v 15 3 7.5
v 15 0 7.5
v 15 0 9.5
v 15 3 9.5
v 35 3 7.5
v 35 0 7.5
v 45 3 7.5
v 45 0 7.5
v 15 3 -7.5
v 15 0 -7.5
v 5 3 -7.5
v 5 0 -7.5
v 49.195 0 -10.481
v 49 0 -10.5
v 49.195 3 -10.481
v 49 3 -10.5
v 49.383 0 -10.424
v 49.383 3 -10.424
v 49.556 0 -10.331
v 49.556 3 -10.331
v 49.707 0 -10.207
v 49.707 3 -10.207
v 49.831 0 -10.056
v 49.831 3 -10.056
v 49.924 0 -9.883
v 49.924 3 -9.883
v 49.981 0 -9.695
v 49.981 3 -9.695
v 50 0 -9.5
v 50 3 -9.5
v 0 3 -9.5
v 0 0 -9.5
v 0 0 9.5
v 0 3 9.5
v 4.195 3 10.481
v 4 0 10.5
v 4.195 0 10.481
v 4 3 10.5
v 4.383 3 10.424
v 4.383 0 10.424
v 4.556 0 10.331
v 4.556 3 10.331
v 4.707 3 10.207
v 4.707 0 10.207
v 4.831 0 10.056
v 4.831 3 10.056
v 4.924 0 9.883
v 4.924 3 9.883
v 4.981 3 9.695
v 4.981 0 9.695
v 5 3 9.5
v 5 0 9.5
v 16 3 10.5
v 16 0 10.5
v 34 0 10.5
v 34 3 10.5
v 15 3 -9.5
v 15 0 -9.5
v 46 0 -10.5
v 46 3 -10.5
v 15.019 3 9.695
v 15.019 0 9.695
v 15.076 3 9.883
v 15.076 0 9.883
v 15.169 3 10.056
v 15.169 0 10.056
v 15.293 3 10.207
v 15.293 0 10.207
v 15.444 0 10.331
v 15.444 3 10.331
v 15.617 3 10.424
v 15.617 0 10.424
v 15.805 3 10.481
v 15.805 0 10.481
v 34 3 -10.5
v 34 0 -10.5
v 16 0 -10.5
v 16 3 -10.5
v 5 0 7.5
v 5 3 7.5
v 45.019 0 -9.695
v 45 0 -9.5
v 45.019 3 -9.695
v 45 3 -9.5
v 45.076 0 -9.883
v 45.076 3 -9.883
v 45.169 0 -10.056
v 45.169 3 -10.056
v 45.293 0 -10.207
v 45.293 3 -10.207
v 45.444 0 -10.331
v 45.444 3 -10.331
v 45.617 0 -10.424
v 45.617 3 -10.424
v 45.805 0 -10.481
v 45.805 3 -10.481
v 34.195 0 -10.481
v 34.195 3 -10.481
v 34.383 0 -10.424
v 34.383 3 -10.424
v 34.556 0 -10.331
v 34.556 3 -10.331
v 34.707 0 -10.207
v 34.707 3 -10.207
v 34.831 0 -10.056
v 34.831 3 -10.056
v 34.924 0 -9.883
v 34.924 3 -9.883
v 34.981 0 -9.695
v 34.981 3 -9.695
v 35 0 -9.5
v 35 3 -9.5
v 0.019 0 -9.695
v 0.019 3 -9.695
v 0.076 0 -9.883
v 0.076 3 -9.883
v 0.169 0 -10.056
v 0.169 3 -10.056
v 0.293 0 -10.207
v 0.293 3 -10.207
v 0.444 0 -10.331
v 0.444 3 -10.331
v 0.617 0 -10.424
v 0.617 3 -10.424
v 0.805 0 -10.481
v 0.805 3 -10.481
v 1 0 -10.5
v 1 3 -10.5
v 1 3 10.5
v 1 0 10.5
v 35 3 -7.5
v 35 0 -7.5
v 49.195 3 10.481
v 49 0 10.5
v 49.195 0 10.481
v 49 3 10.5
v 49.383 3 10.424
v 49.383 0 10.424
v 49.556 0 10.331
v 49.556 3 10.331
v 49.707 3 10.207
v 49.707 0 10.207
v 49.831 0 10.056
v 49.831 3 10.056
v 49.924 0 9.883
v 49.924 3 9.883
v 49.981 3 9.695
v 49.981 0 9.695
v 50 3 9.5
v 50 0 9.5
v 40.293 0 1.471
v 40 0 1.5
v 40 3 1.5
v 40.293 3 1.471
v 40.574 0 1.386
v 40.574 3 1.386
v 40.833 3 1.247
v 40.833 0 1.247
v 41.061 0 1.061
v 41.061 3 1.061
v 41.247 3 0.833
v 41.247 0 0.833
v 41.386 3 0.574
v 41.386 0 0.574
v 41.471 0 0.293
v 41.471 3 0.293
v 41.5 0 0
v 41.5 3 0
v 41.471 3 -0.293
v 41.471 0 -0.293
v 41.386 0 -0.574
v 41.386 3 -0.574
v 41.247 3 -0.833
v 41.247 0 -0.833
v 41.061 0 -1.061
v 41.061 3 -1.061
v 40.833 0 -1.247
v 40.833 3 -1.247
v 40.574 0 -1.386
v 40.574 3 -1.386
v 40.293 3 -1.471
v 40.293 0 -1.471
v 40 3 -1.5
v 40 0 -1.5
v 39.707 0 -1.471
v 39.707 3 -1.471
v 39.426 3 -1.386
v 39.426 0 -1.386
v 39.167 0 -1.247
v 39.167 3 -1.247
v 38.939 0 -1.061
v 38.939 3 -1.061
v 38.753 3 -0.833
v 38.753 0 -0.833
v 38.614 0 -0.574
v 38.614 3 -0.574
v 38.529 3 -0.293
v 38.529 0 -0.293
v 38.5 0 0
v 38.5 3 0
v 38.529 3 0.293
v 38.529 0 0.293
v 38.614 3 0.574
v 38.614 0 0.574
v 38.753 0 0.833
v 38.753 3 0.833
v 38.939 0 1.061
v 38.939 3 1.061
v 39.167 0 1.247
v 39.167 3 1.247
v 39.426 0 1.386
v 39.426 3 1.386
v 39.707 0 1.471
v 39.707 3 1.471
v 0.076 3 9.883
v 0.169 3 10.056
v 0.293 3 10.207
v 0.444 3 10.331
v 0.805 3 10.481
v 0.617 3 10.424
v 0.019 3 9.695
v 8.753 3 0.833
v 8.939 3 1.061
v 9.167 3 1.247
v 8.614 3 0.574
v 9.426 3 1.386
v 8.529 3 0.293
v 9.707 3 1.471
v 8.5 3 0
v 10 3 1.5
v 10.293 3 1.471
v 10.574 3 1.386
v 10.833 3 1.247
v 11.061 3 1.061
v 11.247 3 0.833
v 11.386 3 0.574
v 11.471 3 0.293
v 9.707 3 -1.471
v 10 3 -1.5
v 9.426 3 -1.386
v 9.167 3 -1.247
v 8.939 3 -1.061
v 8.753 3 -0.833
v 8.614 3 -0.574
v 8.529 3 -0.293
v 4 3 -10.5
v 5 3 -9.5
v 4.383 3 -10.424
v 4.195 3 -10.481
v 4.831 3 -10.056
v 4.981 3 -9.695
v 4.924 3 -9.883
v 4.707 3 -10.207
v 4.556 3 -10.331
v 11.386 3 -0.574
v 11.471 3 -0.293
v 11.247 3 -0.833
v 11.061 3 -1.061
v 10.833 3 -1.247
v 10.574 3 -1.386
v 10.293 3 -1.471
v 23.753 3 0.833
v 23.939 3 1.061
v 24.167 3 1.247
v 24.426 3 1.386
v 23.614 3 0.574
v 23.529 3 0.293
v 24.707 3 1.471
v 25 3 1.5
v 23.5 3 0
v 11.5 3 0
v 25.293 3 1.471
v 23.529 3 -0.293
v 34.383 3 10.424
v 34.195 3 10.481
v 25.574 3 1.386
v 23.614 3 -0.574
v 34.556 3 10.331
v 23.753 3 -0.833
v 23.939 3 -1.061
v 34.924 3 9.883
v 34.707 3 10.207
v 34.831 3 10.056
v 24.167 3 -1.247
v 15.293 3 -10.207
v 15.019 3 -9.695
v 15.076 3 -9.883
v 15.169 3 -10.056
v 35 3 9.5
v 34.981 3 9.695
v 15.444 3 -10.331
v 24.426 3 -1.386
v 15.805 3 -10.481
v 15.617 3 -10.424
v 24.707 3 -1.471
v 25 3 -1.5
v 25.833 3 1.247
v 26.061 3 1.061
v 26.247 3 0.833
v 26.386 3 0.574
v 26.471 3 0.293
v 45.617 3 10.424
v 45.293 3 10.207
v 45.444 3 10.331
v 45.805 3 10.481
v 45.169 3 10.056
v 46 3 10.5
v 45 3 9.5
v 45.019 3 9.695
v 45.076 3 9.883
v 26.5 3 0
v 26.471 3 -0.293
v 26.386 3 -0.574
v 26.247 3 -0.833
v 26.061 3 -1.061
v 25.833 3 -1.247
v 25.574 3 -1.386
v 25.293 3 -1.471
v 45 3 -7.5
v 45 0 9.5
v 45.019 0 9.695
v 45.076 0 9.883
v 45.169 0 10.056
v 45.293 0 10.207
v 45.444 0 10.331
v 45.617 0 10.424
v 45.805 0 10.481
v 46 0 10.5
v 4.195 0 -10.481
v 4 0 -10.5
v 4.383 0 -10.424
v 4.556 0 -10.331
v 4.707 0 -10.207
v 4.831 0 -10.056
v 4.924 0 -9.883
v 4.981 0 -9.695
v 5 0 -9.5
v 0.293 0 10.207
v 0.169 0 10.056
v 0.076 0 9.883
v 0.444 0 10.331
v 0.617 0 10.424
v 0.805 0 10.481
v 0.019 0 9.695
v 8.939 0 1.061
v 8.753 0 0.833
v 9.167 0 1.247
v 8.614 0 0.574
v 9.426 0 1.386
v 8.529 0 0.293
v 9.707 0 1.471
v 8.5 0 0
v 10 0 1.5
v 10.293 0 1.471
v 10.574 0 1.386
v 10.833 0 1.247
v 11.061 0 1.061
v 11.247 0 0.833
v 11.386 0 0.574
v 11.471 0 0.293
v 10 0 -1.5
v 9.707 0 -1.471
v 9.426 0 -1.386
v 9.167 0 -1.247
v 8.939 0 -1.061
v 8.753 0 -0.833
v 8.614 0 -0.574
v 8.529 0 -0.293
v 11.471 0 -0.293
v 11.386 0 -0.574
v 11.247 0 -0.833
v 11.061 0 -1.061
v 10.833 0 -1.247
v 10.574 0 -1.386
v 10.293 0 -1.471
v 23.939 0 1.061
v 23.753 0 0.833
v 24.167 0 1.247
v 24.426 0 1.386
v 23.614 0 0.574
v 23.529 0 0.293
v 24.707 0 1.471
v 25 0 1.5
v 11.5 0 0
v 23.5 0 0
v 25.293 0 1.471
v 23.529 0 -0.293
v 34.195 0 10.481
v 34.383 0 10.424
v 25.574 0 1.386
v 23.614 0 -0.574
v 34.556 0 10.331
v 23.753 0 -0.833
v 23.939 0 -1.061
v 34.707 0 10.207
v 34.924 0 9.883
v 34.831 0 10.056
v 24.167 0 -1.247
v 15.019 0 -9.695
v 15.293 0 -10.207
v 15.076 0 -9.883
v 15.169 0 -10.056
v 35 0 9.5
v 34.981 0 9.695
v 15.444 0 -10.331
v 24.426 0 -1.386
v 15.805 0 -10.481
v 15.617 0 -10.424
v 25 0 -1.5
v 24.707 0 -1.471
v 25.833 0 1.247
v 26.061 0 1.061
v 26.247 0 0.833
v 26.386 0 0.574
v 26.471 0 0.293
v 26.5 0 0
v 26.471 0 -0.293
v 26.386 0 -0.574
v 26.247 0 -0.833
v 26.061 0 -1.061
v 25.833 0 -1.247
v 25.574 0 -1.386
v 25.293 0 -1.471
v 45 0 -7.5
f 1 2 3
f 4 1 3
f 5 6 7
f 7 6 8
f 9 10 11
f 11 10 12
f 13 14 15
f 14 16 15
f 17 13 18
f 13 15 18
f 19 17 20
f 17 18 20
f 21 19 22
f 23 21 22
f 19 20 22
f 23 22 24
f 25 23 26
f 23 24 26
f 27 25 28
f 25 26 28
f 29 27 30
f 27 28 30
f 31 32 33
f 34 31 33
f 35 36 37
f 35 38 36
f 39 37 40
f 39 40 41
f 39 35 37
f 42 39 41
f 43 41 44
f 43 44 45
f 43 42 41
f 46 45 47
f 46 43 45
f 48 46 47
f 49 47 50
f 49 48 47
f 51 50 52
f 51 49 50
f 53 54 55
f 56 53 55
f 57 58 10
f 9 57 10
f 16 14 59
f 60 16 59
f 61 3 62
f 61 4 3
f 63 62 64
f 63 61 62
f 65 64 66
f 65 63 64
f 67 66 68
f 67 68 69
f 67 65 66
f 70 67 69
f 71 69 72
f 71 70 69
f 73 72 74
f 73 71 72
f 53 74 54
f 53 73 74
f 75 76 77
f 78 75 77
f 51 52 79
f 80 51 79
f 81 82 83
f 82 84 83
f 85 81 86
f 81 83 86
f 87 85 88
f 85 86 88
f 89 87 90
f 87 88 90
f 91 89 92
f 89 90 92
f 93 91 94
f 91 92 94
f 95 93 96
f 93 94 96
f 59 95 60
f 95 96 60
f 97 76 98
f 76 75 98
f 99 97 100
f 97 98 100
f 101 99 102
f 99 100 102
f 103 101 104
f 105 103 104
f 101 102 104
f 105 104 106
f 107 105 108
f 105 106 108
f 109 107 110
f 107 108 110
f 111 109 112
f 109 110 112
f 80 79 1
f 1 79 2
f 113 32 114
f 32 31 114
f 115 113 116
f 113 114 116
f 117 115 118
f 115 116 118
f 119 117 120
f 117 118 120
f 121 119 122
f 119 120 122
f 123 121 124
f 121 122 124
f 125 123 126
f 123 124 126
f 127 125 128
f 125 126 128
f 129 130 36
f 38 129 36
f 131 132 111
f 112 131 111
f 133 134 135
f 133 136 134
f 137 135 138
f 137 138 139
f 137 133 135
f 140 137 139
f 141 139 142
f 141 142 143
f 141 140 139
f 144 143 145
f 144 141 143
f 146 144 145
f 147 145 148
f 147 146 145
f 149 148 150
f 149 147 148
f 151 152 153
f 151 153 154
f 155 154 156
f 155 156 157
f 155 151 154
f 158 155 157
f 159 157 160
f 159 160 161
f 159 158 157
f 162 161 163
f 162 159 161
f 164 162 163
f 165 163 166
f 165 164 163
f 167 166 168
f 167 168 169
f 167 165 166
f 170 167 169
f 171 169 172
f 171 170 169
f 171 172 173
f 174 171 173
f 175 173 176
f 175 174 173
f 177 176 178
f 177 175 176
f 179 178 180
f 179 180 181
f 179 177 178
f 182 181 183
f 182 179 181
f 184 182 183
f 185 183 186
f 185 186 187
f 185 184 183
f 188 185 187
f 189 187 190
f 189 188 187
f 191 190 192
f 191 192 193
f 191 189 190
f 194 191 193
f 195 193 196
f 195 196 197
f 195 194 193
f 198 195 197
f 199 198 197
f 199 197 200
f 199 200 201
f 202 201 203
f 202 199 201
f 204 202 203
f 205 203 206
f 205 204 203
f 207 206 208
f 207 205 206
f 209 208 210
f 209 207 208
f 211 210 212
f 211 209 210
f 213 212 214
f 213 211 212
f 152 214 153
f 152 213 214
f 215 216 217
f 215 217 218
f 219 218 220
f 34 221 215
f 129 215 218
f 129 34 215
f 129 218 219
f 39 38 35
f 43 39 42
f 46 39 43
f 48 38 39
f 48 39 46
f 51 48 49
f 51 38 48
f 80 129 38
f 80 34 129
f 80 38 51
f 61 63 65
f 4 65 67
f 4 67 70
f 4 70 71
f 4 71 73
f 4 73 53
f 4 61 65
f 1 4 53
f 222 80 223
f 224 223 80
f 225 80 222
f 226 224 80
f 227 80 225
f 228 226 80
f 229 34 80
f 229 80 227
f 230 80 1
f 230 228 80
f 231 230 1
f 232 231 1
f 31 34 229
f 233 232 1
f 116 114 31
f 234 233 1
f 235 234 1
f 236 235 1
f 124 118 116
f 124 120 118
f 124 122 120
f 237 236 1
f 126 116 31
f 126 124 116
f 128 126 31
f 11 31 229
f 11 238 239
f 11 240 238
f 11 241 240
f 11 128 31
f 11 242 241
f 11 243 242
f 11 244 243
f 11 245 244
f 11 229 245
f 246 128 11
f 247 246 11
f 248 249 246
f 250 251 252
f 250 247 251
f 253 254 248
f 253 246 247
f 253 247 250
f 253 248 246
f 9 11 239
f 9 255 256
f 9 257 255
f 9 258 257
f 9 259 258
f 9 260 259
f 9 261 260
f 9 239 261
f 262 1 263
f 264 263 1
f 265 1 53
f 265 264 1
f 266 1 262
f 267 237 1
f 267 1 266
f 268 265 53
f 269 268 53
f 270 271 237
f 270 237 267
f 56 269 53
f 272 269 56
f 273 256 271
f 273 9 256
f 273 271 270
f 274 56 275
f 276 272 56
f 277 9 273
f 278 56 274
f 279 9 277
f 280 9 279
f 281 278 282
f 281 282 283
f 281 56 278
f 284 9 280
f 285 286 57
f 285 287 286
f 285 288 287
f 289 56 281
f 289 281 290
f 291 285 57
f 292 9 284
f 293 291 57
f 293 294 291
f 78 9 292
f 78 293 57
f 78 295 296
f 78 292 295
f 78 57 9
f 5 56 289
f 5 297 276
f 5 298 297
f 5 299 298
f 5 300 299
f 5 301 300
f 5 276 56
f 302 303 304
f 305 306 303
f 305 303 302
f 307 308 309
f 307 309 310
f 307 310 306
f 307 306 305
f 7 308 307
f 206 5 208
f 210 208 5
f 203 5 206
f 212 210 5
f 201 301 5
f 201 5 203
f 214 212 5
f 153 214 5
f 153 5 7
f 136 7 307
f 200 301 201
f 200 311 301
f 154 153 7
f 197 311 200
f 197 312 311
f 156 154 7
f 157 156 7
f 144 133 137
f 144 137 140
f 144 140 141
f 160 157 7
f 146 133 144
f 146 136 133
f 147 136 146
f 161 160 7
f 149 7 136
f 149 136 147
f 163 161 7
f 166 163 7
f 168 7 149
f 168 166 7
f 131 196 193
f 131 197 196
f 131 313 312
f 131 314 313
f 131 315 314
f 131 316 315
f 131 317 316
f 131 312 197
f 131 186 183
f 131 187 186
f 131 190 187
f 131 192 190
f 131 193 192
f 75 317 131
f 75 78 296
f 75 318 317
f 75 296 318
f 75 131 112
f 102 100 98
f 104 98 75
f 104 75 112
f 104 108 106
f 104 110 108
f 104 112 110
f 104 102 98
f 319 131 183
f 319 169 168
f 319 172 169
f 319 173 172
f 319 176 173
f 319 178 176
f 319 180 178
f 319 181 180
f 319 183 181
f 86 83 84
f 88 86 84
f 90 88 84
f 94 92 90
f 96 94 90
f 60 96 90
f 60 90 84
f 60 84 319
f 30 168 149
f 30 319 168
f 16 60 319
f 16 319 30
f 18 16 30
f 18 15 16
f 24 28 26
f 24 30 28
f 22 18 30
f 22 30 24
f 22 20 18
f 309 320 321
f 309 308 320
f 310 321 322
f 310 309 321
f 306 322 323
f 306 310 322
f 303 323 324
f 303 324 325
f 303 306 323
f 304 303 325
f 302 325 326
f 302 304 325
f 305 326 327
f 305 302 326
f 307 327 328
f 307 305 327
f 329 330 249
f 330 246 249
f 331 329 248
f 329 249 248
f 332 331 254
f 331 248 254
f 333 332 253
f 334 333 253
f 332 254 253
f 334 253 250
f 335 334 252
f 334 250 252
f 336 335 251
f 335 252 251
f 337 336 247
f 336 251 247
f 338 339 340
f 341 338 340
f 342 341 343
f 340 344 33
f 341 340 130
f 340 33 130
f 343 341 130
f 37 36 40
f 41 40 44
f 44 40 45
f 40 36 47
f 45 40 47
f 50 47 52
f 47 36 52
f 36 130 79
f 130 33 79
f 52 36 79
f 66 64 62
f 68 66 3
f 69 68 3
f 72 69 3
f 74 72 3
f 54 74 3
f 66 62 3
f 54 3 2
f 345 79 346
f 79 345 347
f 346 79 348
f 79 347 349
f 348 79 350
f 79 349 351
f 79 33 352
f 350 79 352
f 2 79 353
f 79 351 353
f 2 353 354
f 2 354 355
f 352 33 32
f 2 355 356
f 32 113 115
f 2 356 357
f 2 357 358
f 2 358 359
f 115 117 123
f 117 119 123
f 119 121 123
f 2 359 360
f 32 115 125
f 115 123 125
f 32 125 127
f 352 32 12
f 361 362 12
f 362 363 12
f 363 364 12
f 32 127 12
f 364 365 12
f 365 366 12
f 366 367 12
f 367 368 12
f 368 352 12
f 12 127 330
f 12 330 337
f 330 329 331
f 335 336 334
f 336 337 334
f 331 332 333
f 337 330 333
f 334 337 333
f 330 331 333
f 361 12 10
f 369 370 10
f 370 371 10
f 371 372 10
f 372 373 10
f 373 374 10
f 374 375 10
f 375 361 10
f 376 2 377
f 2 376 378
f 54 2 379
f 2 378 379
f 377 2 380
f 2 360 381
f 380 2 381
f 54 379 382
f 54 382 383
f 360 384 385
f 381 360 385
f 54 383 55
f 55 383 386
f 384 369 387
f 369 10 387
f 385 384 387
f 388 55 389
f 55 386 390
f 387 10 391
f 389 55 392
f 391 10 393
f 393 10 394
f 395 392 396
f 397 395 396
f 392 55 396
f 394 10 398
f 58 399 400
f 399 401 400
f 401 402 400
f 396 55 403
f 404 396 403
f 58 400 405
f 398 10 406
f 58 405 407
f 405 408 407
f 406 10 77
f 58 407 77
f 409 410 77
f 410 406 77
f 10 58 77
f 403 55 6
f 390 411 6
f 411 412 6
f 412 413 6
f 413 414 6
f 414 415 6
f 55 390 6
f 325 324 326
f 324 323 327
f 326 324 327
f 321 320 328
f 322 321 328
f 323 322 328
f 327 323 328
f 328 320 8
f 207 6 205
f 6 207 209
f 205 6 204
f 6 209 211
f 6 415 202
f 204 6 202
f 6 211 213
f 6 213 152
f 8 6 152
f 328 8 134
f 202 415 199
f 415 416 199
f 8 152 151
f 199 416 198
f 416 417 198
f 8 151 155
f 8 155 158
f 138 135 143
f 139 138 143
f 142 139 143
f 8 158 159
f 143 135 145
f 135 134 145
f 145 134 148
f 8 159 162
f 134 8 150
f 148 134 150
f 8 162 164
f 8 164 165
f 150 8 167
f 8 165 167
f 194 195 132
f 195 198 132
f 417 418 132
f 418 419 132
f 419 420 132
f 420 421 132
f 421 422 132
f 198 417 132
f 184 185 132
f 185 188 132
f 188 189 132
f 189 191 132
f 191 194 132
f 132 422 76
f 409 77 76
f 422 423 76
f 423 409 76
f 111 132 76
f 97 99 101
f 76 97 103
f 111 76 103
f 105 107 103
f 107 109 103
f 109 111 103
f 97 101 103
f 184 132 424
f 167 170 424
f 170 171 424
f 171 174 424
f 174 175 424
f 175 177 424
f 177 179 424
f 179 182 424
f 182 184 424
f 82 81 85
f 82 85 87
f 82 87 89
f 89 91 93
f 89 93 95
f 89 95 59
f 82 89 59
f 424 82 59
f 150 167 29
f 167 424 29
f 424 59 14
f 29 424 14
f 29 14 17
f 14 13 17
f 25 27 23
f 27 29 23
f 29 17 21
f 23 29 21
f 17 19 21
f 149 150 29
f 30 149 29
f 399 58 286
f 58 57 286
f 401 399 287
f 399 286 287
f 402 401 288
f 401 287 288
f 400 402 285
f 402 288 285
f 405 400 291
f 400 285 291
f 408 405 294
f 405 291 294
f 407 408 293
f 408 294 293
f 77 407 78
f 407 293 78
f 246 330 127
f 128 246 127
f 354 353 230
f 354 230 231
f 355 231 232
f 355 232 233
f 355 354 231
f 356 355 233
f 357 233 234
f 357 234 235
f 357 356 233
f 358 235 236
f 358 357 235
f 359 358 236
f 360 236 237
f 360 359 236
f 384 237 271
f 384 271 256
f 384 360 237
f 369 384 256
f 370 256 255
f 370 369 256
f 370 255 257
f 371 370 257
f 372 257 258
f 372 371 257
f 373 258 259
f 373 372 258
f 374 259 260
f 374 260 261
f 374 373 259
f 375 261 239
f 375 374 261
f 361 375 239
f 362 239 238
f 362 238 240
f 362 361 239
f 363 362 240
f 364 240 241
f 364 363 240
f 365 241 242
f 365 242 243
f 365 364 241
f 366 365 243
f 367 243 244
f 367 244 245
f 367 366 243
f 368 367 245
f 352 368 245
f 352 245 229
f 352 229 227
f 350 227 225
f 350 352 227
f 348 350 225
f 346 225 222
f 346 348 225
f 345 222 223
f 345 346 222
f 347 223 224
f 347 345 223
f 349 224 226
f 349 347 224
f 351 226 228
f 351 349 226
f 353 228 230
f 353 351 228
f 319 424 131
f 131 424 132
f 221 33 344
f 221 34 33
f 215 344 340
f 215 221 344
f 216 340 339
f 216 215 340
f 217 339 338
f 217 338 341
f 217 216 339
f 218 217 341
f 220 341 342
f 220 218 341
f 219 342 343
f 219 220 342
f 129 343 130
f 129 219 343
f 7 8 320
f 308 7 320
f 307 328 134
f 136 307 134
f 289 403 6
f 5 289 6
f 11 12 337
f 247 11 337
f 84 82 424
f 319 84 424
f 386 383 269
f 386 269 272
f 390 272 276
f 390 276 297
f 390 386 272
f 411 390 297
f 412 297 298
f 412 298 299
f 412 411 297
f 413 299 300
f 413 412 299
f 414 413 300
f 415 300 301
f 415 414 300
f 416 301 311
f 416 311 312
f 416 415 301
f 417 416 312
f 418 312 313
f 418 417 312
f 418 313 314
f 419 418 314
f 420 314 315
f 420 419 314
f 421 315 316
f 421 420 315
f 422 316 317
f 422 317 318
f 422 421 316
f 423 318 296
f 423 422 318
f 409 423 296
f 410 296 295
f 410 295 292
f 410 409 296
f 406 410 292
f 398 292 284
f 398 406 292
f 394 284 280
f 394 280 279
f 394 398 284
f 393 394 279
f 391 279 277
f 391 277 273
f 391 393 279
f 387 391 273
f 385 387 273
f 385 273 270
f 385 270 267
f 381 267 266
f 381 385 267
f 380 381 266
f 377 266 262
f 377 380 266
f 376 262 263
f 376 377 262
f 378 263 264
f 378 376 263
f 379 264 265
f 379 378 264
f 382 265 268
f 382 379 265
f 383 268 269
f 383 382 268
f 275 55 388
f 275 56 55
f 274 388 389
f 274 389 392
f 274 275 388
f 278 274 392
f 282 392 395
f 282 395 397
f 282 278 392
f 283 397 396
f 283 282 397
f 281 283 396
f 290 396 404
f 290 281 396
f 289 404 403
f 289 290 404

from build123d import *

# Parameters (mm, degrees)
SKETCH_1_R      = 1.5
EXTRUDE_1_DEPTH = 3
FILLET_1_R      = 1


with BuildPart() as part:
    # 草图1 → 凸台-拉伸1 (new body)
    with BuildSketch(Plane(origin=(0, 0, 0), x_dir=(1, 0, 0), z_dir=(0, 1, 0))):
        Polygon((0, 10.5), (0, -10.5), (5, -10.5), (5, -7.5), (15, -7.5), (15, -10.5), (35, -10.5), (35, -7.5), (45, -7.5), (45, -10.5), (50, -10.5), (50, 10.5), (45, 10.5), (45, 7.5), (35, 7.5), (35, 10.5), (15, 10.5), (15, 7.5), (5, 7.5), (5, 10.5), align=None)
        with Locations(Location((10, 0, 0), (0, 0, 270))):
            Circle(SKETCH_1_R, mode=Mode.SUBTRACT)
        with Locations(Location((40, 0, 0), (0, 0, 270))):
            Circle(SKETCH_1_R, mode=Mode.SUBTRACT)
        with Locations(Location((25, 0, 0), (0, 0, 270))):
            Circle(SKETCH_1_R, mode=Mode.SUBTRACT)
    extrude(amount=EXTRUDE_1_DEPTH)

    # 圆角1
    fillet_1_edges = [part.edges().sort_by_distance(p)[0] for p in [
        (0, 1.5, 10.5),
        (0, 1.5, -10.5),
        (5, 1.5, -10.5),
        (15, 1.5, -10.5),
        (35, 1.5, -10.5),
        (45, 1.5, -10.5),
        (50, 1.5, -10.5),
        (50, 1.5, 10.5),
        (45, 1.5, 10.5),
        (35, 1.5, 10.5),
        (15, 1.5, 10.5),
        (5, 1.5, 10.5),
    ]]
    fillet(fillet_1_edges, radius=FILLET_1_R)


solid = part.part
